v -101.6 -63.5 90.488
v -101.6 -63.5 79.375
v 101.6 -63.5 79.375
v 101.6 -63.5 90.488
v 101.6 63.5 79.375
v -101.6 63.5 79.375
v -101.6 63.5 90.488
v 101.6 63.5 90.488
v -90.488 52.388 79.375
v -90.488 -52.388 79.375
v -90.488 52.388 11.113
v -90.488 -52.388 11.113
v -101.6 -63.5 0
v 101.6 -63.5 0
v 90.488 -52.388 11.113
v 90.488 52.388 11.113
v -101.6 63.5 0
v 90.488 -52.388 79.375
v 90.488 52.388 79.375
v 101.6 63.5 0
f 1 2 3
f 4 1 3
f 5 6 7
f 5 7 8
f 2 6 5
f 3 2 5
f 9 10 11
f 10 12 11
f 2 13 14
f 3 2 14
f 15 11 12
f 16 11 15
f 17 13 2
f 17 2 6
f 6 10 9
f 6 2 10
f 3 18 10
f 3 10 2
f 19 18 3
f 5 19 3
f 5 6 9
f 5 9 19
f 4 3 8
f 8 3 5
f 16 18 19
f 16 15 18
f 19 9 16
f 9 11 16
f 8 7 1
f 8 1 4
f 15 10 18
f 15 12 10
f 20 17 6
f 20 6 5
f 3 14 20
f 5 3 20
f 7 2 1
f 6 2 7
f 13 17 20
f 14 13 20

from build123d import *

# Parameters (mm, degrees)
F0_W     = 203.2
F0_H     = 127
F1_DEPTH = 79.375
F2_T     = -11.1125
F3_W     = 203.2
F3_H     = 127
F4_DEPTH = 11.1125


with BuildPart() as f1:
    # F0 (on Top) → F1 (new body)
    with BuildSketch(Plane.XY):
        Rectangle(F0_W, F0_H)
    extrude(amount=F1_DEPTH)

    # F2
    f2_openings = [f1.faces().sort_by_distance(p)[0] for p in [
        (0, 0, 79.375),
    ]]
    offset(amount=F2_T, openings=f2_openings)


with BuildPart() as f4:
    # F3 (on face) → F4 (new body)
    with BuildSketch(Plane.XY.offset(79.375)):
        Rectangle(F3_W, F3_H)
    extrude(amount=F4_DEPTH)


solid = Compound([f1.part, f4.part])
